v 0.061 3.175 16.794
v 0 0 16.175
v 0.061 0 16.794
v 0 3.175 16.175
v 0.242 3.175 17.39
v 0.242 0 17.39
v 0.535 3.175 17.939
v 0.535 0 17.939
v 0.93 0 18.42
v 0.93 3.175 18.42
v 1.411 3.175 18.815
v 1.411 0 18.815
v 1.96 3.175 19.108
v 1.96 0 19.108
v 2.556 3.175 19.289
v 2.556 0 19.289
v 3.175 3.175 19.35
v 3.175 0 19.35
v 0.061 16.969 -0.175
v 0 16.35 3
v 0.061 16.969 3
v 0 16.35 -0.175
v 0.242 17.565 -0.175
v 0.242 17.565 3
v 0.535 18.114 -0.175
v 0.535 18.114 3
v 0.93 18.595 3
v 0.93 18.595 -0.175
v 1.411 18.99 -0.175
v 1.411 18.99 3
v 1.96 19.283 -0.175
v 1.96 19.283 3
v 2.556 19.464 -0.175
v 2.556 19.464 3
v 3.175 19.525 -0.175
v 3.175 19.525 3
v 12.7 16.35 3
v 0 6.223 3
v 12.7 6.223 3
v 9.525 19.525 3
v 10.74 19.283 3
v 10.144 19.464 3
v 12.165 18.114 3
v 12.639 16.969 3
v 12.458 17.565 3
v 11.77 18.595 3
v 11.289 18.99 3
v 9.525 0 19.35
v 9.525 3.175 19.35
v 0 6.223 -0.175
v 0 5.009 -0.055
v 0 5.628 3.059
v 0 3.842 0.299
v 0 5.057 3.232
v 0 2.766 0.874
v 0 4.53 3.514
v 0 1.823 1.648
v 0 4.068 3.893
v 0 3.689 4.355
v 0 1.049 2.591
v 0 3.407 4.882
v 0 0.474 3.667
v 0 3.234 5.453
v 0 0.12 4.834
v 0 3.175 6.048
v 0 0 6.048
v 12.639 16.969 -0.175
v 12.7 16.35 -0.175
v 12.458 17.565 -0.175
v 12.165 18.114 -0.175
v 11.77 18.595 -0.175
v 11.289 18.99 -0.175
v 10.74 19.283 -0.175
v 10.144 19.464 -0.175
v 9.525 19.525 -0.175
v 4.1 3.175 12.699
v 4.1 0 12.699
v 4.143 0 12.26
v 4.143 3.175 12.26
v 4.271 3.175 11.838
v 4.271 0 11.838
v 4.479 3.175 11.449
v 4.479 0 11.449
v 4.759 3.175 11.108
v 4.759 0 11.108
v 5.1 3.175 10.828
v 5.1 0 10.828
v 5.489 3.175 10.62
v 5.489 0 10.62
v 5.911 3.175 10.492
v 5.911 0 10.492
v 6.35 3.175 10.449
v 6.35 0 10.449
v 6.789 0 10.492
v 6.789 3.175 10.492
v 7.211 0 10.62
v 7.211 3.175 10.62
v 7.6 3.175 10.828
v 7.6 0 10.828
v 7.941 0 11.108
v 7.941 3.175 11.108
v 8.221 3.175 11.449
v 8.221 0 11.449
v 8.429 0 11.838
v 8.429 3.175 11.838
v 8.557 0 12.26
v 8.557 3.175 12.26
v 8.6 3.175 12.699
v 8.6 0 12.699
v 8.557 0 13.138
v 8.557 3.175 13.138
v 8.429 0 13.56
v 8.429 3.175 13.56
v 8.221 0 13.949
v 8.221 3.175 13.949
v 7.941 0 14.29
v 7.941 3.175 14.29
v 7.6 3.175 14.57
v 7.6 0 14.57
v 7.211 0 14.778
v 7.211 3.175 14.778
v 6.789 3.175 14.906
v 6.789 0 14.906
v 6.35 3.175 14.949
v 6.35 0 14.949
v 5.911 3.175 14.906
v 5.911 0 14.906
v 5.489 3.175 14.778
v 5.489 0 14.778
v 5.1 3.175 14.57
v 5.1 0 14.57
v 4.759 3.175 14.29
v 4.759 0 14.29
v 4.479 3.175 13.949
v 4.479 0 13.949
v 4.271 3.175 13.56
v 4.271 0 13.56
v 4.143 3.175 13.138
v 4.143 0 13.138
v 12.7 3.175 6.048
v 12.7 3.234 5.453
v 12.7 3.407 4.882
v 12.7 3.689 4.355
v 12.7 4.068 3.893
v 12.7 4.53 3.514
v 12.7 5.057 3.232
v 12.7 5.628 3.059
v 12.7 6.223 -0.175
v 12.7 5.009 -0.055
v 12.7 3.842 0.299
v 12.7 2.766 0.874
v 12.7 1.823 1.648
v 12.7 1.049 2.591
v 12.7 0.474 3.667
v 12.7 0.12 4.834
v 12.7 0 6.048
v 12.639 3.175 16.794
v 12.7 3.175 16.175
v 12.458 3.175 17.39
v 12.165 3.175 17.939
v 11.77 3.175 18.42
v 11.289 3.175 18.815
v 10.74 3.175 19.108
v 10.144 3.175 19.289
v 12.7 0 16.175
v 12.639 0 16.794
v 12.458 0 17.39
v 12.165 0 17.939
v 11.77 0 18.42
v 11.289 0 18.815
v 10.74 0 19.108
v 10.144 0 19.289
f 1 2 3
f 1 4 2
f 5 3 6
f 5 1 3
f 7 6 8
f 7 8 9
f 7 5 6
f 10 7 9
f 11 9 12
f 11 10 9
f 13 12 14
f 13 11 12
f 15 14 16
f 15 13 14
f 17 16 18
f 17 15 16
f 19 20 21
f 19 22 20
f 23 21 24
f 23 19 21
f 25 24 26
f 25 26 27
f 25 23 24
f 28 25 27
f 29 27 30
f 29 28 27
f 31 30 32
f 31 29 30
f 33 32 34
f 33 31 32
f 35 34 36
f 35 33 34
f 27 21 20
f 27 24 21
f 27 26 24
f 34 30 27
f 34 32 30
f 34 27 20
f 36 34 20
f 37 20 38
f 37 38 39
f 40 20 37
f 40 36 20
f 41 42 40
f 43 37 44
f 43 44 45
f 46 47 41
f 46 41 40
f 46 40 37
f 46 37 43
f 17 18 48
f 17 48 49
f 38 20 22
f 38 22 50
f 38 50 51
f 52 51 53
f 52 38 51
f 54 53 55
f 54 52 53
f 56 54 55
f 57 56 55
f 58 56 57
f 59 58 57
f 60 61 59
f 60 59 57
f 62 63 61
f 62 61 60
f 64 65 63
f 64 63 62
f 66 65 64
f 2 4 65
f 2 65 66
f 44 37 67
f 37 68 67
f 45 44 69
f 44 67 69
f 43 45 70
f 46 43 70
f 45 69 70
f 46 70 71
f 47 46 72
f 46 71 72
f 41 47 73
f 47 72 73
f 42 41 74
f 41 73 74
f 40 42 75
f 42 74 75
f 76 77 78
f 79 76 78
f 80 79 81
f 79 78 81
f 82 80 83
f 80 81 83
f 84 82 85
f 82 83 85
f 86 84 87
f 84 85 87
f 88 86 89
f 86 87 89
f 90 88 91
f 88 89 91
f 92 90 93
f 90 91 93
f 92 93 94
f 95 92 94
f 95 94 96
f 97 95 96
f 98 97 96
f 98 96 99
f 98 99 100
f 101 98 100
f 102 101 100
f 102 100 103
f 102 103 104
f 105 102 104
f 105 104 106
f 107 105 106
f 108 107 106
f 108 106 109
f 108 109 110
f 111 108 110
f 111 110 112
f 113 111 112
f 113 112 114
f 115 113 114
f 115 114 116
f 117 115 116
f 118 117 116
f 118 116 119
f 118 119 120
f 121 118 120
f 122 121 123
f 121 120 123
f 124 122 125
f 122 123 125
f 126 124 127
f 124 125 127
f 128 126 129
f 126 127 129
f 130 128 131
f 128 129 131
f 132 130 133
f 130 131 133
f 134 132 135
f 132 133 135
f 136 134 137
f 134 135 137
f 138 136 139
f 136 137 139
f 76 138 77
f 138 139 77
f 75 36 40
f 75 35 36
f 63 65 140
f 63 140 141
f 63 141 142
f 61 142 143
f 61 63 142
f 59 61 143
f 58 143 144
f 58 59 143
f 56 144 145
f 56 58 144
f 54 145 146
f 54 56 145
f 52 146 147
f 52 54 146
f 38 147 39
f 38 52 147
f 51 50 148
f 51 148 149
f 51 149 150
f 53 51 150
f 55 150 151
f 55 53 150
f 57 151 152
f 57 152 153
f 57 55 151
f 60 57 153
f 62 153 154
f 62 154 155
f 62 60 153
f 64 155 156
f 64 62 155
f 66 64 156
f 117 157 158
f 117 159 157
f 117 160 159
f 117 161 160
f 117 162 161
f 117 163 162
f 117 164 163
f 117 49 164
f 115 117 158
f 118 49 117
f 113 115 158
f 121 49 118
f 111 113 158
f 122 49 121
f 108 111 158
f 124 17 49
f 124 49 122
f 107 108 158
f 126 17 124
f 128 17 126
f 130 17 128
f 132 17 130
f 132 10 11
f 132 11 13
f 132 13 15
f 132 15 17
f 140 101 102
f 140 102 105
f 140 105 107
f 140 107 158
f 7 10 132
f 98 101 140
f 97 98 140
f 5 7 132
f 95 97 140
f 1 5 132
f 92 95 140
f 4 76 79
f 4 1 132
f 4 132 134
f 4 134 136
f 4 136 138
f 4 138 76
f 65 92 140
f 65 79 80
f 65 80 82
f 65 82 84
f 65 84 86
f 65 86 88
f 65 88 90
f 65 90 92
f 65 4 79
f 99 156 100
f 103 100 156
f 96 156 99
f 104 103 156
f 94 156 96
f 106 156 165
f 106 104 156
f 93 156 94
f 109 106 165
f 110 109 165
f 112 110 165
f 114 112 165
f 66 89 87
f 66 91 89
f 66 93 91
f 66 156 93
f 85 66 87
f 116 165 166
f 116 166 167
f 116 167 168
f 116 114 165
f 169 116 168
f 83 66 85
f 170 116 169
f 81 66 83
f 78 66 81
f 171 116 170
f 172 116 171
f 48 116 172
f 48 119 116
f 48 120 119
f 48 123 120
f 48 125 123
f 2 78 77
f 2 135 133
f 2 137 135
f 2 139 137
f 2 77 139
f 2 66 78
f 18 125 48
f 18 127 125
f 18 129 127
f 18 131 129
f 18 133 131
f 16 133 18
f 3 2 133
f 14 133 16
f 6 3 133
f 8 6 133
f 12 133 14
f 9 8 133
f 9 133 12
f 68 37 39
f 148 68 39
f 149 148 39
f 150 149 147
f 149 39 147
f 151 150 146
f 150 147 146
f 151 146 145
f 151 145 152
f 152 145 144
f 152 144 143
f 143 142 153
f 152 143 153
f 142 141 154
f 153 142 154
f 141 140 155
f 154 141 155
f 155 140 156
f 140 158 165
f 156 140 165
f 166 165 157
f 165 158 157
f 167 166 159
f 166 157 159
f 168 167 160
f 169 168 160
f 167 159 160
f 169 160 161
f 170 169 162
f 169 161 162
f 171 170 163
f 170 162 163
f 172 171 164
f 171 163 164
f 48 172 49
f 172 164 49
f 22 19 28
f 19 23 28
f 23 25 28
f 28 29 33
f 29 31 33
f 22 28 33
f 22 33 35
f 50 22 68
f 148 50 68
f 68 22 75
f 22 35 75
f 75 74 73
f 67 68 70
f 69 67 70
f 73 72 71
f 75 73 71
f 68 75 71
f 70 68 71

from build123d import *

# Parameters (mm, degrees)
SKETCH1_W                    = 12.7
SKETCH1_H                    = 19.525000066
BOSS_EXTRUDE1_DEPTH          = 3
CONVERT_SOLID2_START         = -0.175
CONVERT_SOLID2_OUTLINE_W     = 12.7
CONVERT_SOLID2_OUTLINE_H     = 19.525000066
CONVERT_SOLID2_DEPTH         = 0.175
EDGE_FLANGE1_STRIP_W         = 18.796
EDGE_FLANGE1_STRIP_H         = 3.175
EDGE_FLANGE1_STRIP_CUT_DEPTH = 12.7
EDGE_FLANGE1_DEPTH           = 12.7
M4_CLEARANCE_HOLE4_D         = 4.5
M4_CLEARANCE_HOLE4_DEPTH     = 16.002
M4_CLEARANCE_HOLE4_TIP       = 1.351936393
FILLET1_R                    = 3.175


# Read off the part's stored shape, not the designer's step: Convert-Solid2
# Sheet-metal steps are written as plain solids
with BuildPart() as part:
    # Sketch1 → Boss-Extrude1 (new body)
    with BuildSketch(Plane.XY):
        with Locations((6.35, 9.762500033)):
            Rectangle(SKETCH1_W, SKETCH1_H)
    extrude(amount=BOSS_EXTRUDE1_DEPTH)

    # Convert-Solid2 outline → Convert-Solid2 (add)
    with BuildSketch(Plane.XY.offset(CONVERT_SOLID2_START)):
        with Locations((6.35, 9.762500033)):
            Rectangle(CONVERT_SOLID2_OUTLINE_W, CONVERT_SOLID2_OUTLINE_H)
    extrude(amount=CONVERT_SOLID2_DEPTH)

    # Edge-Flange1 strip (across the edge) → Edge-Flange1 strip cut (cut)
    with BuildSketch(Plane(origin=(0, 0, 3), x_dir=(0, 1, 0), z_dir=(1, 0, 0))):
        with Locations((-3.175, -1.5875)):
            Rectangle(EDGE_FLANGE1_STRIP_W, EDGE_FLANGE1_STRIP_H)
    extrude(amount=EDGE_FLANGE1_STRIP_CUT_DEPTH, mode=Mode.SUBTRACT)

    # Edge-Flange1 section (across the edge) → Edge-Flange1 (add)
    with BuildSketch(Plane(origin=(0, 0, 3), x_dir=(0, 1, 0), z_dir=(1, 0, 0))):
        with BuildLine():
            Line((0, 3.048), (0, 16.350000066))
            Line((0, 16.350000066), (3.175, 16.350000066))
            Line((3.175, 16.350000066), (3.175, 3.048))
            ThreePointArc((3.175, 3.048), (4.067738531, 0.892738531), (6.223, 0))
            Line((6.223, 0), (6.223, -3.175))
            ThreePointArc((6.223, -3.175), (1.822674501, -1.352325499), (0, 3.048))
        make_face()
    extrude(amount=EDGE_FLANGE1_DEPTH)

    # M4 Clearance Hole4
    with Locations(Plane(origin=(0, 3.175, 0), x_dir=(1, 0, 0), z_dir=(0, 1, 0))):
        with Locations((6.35, -12.699000033)):
            Hole(M4_CLEARANCE_HOLE4_D / 2, depth=M4_CLEARANCE_HOLE4_DEPTH)
            with Locations((0, 0, -(M4_CLEARANCE_HOLE4_DEPTH + M4_CLEARANCE_HOLE4_TIP / 2))):  # 118° drill point
                Cone(0, M4_CLEARANCE_HOLE4_D / 2, M4_CLEARANCE_HOLE4_TIP, mode=Mode.SUBTRACT)

    # Fillet1
    fillet1_edges = [part.edges().sort_by_distance(p)[0] for p in [
        (0, 1.5875, 19.350000066),
        (12.7, 1.5875, 19.350000066),
        (0, 19.525000066, 1.4125),
        (12.7, 19.525000066, 1.4125),
    ]]
    fillet(fillet1_edges, radius=FILLET1_R)


solid = part.part
